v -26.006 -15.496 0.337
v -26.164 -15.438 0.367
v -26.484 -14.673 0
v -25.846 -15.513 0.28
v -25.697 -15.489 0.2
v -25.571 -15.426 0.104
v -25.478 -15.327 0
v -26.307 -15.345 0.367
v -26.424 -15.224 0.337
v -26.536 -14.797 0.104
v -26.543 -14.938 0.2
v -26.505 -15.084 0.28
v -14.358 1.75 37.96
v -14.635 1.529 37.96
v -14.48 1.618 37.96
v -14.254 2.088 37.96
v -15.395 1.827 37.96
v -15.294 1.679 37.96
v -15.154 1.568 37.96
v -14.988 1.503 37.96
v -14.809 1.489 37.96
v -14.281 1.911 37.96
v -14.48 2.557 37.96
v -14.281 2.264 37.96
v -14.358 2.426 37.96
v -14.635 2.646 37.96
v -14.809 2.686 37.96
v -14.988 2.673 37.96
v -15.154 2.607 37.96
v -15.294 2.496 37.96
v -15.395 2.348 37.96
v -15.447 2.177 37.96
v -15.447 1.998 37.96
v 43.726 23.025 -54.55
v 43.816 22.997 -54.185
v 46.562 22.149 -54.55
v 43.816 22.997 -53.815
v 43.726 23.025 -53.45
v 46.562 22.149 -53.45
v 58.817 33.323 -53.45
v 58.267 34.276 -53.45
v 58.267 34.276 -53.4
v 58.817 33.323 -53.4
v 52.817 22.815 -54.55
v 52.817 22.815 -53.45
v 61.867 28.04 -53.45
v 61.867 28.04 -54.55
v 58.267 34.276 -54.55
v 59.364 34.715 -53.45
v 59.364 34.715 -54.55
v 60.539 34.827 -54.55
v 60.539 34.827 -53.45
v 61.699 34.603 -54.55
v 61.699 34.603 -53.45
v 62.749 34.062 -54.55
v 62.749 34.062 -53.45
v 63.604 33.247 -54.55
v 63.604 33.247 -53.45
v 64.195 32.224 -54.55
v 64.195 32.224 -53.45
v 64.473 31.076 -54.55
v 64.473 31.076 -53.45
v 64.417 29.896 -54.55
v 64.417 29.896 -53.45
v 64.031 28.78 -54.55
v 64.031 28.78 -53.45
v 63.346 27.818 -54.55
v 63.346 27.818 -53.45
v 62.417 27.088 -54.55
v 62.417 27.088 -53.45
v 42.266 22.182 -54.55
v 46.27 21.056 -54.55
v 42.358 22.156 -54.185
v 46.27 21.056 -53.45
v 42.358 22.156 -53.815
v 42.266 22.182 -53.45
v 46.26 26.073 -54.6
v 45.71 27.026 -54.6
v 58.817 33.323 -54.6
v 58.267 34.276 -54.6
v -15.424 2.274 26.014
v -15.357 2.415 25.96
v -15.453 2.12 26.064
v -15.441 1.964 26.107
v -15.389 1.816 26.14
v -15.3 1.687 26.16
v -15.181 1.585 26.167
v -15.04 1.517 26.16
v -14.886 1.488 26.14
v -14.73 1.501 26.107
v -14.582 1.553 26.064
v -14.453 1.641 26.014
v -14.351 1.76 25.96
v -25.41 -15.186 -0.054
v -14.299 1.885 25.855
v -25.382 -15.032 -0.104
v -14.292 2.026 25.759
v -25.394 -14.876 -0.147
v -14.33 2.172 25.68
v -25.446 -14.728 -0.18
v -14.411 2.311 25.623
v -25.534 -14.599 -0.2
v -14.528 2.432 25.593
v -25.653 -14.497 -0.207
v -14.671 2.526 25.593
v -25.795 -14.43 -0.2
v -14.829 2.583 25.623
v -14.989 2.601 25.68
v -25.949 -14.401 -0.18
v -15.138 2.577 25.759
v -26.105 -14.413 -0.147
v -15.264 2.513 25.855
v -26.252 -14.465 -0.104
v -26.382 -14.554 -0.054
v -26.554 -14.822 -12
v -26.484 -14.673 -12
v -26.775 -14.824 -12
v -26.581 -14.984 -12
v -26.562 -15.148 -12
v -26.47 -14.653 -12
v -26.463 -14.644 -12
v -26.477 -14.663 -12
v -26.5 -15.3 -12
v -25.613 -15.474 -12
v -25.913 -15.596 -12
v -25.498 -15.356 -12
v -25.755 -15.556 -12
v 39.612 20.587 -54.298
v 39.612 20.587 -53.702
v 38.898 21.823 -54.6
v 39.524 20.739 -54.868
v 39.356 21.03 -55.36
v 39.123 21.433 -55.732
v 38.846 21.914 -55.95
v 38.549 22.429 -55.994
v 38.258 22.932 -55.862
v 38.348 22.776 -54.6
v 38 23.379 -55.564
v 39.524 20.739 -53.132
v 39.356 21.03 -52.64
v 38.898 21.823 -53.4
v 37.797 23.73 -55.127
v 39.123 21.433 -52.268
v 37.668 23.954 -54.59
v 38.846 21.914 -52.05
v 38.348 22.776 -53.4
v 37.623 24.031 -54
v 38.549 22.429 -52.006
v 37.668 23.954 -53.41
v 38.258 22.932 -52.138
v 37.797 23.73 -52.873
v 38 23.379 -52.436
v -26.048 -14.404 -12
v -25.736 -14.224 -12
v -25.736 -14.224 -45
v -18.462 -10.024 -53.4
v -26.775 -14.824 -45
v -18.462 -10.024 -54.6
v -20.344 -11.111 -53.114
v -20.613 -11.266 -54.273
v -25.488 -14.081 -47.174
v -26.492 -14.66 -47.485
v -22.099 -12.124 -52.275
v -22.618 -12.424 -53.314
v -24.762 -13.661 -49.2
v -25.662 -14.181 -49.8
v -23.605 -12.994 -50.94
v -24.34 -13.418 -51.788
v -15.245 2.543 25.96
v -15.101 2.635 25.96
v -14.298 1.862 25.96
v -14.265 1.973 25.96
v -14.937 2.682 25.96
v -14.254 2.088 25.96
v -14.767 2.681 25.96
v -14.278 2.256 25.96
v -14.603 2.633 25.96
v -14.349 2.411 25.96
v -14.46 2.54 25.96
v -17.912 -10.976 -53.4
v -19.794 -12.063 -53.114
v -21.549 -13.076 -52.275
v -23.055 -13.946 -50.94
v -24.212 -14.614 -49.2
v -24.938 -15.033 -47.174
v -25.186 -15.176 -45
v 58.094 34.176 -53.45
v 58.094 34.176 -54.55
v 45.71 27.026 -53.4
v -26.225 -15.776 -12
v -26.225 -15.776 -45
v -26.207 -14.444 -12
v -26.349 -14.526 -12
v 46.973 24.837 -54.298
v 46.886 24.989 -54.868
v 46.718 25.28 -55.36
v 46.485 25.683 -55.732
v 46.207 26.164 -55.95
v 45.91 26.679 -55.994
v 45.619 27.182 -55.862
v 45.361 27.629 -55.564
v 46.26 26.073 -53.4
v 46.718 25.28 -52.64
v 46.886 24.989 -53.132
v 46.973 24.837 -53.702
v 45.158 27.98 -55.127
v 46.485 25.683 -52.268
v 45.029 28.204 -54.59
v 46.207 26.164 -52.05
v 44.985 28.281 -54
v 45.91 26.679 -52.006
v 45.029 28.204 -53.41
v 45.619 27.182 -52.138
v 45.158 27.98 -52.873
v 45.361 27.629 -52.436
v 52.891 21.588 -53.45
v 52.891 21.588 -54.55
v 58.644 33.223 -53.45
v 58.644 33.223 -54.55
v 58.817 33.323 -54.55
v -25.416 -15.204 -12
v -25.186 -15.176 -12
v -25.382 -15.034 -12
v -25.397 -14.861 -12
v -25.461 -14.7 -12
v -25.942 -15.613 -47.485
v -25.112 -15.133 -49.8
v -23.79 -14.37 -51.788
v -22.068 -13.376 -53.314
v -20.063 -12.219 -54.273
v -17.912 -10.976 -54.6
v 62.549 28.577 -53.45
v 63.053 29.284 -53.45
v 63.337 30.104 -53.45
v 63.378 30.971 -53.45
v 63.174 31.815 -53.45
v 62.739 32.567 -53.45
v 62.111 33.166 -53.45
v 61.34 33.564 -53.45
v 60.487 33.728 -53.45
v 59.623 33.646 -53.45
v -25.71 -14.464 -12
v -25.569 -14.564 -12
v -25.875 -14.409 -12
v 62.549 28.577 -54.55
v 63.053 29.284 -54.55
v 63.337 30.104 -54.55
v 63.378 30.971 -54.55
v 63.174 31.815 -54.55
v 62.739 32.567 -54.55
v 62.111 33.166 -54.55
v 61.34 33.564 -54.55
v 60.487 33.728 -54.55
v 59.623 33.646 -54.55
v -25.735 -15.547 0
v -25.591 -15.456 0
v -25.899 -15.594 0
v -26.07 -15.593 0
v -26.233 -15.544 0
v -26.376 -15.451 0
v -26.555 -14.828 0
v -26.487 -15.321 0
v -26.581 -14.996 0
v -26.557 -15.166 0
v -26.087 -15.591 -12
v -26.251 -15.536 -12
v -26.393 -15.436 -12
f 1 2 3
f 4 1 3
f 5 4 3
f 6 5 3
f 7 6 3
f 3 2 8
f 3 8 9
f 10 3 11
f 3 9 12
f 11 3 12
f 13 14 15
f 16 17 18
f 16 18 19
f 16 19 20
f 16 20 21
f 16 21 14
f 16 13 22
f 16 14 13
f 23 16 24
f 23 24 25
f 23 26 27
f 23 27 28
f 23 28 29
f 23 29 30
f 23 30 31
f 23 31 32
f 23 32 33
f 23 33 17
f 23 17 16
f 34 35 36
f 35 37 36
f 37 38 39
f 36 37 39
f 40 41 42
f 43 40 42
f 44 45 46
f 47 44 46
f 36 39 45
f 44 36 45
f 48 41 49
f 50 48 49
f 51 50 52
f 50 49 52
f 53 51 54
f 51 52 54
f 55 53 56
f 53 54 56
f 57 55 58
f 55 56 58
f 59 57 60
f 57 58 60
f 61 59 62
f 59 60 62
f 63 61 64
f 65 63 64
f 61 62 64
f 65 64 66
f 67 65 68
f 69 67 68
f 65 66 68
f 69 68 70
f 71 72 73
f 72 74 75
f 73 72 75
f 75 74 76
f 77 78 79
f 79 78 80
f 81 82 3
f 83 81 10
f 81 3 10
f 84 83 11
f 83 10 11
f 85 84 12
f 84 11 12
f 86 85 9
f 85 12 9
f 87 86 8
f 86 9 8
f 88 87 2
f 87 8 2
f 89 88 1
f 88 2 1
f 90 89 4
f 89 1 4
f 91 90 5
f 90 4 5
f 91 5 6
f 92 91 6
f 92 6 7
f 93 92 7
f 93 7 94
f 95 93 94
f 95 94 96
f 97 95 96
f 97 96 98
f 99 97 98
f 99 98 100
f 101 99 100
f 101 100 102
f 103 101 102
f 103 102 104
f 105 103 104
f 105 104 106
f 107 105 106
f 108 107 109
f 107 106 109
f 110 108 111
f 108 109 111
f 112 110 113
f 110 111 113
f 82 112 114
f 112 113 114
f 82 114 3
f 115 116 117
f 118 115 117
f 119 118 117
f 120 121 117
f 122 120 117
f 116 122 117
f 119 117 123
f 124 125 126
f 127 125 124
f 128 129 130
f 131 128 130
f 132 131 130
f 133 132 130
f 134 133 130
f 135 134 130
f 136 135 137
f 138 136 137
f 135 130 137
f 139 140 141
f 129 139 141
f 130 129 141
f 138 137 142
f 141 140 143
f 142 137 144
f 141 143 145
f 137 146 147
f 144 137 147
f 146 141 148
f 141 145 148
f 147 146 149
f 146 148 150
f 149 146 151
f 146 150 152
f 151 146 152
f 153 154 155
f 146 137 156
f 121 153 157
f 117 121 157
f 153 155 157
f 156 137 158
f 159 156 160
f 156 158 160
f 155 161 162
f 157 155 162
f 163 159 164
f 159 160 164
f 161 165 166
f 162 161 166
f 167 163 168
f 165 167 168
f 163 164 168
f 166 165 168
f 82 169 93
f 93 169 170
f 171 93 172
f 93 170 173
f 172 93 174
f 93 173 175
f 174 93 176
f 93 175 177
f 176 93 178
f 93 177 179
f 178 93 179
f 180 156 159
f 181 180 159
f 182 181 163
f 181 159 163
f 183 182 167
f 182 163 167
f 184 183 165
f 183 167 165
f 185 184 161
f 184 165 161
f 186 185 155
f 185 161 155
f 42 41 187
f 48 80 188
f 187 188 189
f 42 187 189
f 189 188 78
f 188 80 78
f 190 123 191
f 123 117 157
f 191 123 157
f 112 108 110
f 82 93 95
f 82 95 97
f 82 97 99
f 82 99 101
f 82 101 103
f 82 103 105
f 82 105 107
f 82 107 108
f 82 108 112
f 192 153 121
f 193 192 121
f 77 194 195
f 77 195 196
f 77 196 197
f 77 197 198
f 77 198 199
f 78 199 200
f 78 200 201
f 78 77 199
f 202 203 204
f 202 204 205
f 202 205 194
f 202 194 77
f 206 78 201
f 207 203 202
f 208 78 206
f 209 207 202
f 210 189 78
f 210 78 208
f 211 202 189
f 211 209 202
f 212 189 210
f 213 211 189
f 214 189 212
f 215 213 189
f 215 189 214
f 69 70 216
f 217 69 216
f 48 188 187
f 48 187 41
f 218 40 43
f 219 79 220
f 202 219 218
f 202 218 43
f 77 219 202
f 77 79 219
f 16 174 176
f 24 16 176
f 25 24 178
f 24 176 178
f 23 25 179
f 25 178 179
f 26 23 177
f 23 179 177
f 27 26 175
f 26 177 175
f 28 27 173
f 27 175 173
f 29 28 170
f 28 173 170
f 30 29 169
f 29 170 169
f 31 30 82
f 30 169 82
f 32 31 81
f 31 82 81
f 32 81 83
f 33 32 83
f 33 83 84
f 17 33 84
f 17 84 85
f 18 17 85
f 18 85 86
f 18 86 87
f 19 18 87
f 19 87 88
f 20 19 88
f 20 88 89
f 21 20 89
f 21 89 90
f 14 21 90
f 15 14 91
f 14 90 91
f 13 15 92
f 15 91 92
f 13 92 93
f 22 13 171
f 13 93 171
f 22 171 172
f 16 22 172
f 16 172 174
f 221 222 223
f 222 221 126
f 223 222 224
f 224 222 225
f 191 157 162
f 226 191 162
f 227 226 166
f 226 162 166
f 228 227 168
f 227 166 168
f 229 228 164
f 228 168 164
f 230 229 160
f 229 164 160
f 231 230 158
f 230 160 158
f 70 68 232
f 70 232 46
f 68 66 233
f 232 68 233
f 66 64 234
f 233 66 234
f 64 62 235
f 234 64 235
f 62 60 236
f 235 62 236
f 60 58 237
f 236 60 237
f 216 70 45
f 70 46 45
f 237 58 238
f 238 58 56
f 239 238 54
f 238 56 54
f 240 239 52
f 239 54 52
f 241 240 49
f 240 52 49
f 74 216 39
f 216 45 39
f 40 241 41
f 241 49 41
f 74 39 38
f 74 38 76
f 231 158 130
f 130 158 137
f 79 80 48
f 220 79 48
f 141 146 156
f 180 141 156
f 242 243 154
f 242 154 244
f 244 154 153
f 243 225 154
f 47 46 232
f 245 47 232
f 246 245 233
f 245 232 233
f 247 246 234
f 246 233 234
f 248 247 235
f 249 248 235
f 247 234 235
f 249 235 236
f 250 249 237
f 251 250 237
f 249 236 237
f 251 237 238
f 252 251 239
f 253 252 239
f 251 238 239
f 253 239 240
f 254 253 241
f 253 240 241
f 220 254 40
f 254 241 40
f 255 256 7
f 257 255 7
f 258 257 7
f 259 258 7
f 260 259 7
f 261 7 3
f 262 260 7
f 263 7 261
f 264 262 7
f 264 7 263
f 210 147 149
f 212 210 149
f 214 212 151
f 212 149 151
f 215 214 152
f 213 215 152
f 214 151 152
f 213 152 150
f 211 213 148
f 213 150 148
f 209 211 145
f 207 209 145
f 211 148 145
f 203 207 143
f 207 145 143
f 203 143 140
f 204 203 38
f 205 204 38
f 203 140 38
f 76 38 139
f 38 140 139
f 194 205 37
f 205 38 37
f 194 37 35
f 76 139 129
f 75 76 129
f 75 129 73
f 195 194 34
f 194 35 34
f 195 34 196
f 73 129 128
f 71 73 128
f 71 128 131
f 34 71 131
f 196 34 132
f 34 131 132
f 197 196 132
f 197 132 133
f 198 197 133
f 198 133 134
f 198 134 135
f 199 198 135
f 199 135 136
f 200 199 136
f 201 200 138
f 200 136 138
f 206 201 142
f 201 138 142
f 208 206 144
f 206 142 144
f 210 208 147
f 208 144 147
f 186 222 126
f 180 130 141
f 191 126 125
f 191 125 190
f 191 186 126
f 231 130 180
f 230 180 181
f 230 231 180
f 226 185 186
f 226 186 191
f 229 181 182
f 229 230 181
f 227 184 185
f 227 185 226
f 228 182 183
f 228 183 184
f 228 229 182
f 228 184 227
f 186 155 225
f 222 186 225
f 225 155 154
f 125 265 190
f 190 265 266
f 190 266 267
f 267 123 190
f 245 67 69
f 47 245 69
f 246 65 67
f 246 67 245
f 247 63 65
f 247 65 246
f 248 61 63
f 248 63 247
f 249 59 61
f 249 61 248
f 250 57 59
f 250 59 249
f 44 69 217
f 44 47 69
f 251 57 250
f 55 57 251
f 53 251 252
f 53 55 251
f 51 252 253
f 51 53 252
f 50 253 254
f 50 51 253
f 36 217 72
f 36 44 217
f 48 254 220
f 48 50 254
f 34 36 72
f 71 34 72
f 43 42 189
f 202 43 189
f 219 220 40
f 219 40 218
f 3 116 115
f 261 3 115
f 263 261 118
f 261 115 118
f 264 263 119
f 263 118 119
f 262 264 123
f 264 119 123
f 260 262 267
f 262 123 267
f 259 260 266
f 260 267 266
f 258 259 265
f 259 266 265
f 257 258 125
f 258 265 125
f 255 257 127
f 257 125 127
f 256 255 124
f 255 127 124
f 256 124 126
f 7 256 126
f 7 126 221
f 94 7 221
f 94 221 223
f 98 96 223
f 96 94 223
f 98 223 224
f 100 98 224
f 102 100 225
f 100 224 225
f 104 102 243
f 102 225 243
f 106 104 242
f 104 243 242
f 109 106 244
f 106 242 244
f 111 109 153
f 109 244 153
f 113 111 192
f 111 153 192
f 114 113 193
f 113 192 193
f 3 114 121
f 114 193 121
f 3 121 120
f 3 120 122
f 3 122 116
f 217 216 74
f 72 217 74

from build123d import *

# Parameters (mm, degrees)
S01_TENDON_CAPTIVE_TAIL_R                      = 0.6
F_01_TENDON_CAPTIVE_TAIL_DEPTH                 = 12
S02_CROSSED_TENDON_R                           = 0.6
F_02_CROSSED_TENDON_DEPTH                      = 33.010681761
S03_TENDON_THROUGH_REAR_GROMMET_R              = 0.6
F_03_TENDON_THROUGH_REAR_GROMMET_DEPTH         = 12
F_04_START                                     = -0.55
F_04_TENDON_RETURN_DEPTH                       = 1.1
F_05_START                                     = 0.55
F_05_REMOVABLE_BACKED_EYE_AROUND_POLISHE_DEPTH = 1.1
S06_DRESSED_EYE_KNOT_ENVELOPE_R                = 2
F_06_DRESSED_EYE_KNOT_ENVELOPE_DEPTH           = 8.5


with BuildPart() as part:
    # S01 - Tendon captive tail → 01 - Tendon captive tail (new body)
    with BuildSketch(Plane.XY.offset(25.959868809)):
        with Locations((-14.854021031, 2.087596514)):
            Circle(S01_TENDON_CAPTIVE_TAIL_R)
    extrude(amount=F_01_TENDON_CAPTIVE_TAIL_DEPTH)

    # S02 - Crossed tendon → 02 - Crossed tendon (add)
    with BuildSketch(Plane(origin=(-5.56891097, -8.552306823, -12.992860813), x_dir=(0.9414814256928209, -0.18532252929363746, -0.28154623991739347), z_dir=(0.33706486775606503, 0.5176384007444039, 0.7864081389452696))):
        with Locations(Location((-21.680567016, -12.529320029, 0), (0, 0, 152.8840726))):
            Circle(S02_CROSSED_TENDON_R)
    extrude(amount=F_02_CROSSED_TENDON_DEPTH)

    # S03 - Tendon through rear grommet → 03 - Tendon through rear grommet (add)
    with BuildSketch(Plane.XY.offset(-12)):
        with Locations(Location((-25.980762114, -15, 0), (0, 0, 146.929477468))):
            Circle(S03_TENDON_THROUGH_REAR_GROMMET_R)
    extrude(amount=F_03_TENDON_THROUGH_REAR_GROMMET_DEPTH)

    # S04 - Tendon return → 04 - Tendon return (add)
    with BuildSketch(Plane(origin=(0, 0, 0), x_dir=(-0.8660254037844386, -0.5000000000000001, 0), z_dir=(0.5000000000000001, -0.8660254037844386, 0)).offset(F_04_START)):
        with BuildLine():
            Line((30.6, 12), (30.6, 45))
            ThreePointArc((30.6, 45), (27.788225099, 51.788225099), (21, 54.6))
            Line((21, 54.6), (-67.598500564, 54.6))
            Line((-67.598500564, 54.6), (-67.598500564, 53.4))
            Line((-67.598500564, 53.4), (21, 53.4))
            ThreePointArc((21, 53.4), (26.939696962, 50.939696962), (29.4, 45))
            Line((29.4, 45), (29.4, 12))
            Line((29.4, 12), (30.6, 12))
        make_face()
    extrude(amount=F_04_TENDON_RETURN_DEPTH)

    # S05 - Removable backed eye around polished clevis sleeve → 05 - Removable backed eye around polished clevis sleeve (add)
    with BuildSketch(Plane.XY.offset(-54).offset(F_05_START)):
        with BuildLine():
            Line((58.093813666, 34.175564254), (58.267018746, 34.275564254))
            ThreePointArc((58.267018746, 34.275564254), (63.936024172, 32.756558829), (62.417018746, 27.087553403))
            Line((62.417018746, 27.087553403), (52.890739305, 21.587553403))
            Line((52.890739305, 21.587553403), (46.269586882, 21.055725804))
            Line((46.269586882, 21.055725804), (40.755485267, 22.606429959))
            Line((40.755485267, 22.606429959), (41.221510671, 23.799250282))
            Line((41.221510671, 23.799250282), (46.562407205, 22.148546127))
            Line((46.562407205, 22.148546127), (52.817053277, 22.815181347))
            Line((52.817053277, 22.815181347), (61.867018746, 28.040181347))
            ThreePointArc((61.867018746, 28.040181347), (62.983396228, 32.206558829), (58.817018746, 33.32293631))
            Line((58.817018746, 33.32293631), (58.643813666, 33.22293631))
            Line((58.643813666, 33.22293631), (58.093813666, 34.175564254))
        make_face()
    extrude(amount=-F_05_REMOVABLE_BACKED_EYE_AROUND_POLISHE_DEPTH)

    # S06 - Dressed eye knot envelope → 06 - Dressed eye knot envelope (add)
    with BuildSketch(Plane(origin=(38.623434459, 22.299250282, 0), x_dir=(0, 0, -1), z_dir=(0.8660254037844386, 0.5000000000000001, 0))):
        with Locations(Location((54, 0, 0), (0, 0, 90))):
            Circle(S06_DRESSED_EYE_KNOT_ENVELOPE_R)
    extrude(amount=F_06_DRESSED_EYE_KNOT_ENVELOPE_DEPTH)


solid = part.part
